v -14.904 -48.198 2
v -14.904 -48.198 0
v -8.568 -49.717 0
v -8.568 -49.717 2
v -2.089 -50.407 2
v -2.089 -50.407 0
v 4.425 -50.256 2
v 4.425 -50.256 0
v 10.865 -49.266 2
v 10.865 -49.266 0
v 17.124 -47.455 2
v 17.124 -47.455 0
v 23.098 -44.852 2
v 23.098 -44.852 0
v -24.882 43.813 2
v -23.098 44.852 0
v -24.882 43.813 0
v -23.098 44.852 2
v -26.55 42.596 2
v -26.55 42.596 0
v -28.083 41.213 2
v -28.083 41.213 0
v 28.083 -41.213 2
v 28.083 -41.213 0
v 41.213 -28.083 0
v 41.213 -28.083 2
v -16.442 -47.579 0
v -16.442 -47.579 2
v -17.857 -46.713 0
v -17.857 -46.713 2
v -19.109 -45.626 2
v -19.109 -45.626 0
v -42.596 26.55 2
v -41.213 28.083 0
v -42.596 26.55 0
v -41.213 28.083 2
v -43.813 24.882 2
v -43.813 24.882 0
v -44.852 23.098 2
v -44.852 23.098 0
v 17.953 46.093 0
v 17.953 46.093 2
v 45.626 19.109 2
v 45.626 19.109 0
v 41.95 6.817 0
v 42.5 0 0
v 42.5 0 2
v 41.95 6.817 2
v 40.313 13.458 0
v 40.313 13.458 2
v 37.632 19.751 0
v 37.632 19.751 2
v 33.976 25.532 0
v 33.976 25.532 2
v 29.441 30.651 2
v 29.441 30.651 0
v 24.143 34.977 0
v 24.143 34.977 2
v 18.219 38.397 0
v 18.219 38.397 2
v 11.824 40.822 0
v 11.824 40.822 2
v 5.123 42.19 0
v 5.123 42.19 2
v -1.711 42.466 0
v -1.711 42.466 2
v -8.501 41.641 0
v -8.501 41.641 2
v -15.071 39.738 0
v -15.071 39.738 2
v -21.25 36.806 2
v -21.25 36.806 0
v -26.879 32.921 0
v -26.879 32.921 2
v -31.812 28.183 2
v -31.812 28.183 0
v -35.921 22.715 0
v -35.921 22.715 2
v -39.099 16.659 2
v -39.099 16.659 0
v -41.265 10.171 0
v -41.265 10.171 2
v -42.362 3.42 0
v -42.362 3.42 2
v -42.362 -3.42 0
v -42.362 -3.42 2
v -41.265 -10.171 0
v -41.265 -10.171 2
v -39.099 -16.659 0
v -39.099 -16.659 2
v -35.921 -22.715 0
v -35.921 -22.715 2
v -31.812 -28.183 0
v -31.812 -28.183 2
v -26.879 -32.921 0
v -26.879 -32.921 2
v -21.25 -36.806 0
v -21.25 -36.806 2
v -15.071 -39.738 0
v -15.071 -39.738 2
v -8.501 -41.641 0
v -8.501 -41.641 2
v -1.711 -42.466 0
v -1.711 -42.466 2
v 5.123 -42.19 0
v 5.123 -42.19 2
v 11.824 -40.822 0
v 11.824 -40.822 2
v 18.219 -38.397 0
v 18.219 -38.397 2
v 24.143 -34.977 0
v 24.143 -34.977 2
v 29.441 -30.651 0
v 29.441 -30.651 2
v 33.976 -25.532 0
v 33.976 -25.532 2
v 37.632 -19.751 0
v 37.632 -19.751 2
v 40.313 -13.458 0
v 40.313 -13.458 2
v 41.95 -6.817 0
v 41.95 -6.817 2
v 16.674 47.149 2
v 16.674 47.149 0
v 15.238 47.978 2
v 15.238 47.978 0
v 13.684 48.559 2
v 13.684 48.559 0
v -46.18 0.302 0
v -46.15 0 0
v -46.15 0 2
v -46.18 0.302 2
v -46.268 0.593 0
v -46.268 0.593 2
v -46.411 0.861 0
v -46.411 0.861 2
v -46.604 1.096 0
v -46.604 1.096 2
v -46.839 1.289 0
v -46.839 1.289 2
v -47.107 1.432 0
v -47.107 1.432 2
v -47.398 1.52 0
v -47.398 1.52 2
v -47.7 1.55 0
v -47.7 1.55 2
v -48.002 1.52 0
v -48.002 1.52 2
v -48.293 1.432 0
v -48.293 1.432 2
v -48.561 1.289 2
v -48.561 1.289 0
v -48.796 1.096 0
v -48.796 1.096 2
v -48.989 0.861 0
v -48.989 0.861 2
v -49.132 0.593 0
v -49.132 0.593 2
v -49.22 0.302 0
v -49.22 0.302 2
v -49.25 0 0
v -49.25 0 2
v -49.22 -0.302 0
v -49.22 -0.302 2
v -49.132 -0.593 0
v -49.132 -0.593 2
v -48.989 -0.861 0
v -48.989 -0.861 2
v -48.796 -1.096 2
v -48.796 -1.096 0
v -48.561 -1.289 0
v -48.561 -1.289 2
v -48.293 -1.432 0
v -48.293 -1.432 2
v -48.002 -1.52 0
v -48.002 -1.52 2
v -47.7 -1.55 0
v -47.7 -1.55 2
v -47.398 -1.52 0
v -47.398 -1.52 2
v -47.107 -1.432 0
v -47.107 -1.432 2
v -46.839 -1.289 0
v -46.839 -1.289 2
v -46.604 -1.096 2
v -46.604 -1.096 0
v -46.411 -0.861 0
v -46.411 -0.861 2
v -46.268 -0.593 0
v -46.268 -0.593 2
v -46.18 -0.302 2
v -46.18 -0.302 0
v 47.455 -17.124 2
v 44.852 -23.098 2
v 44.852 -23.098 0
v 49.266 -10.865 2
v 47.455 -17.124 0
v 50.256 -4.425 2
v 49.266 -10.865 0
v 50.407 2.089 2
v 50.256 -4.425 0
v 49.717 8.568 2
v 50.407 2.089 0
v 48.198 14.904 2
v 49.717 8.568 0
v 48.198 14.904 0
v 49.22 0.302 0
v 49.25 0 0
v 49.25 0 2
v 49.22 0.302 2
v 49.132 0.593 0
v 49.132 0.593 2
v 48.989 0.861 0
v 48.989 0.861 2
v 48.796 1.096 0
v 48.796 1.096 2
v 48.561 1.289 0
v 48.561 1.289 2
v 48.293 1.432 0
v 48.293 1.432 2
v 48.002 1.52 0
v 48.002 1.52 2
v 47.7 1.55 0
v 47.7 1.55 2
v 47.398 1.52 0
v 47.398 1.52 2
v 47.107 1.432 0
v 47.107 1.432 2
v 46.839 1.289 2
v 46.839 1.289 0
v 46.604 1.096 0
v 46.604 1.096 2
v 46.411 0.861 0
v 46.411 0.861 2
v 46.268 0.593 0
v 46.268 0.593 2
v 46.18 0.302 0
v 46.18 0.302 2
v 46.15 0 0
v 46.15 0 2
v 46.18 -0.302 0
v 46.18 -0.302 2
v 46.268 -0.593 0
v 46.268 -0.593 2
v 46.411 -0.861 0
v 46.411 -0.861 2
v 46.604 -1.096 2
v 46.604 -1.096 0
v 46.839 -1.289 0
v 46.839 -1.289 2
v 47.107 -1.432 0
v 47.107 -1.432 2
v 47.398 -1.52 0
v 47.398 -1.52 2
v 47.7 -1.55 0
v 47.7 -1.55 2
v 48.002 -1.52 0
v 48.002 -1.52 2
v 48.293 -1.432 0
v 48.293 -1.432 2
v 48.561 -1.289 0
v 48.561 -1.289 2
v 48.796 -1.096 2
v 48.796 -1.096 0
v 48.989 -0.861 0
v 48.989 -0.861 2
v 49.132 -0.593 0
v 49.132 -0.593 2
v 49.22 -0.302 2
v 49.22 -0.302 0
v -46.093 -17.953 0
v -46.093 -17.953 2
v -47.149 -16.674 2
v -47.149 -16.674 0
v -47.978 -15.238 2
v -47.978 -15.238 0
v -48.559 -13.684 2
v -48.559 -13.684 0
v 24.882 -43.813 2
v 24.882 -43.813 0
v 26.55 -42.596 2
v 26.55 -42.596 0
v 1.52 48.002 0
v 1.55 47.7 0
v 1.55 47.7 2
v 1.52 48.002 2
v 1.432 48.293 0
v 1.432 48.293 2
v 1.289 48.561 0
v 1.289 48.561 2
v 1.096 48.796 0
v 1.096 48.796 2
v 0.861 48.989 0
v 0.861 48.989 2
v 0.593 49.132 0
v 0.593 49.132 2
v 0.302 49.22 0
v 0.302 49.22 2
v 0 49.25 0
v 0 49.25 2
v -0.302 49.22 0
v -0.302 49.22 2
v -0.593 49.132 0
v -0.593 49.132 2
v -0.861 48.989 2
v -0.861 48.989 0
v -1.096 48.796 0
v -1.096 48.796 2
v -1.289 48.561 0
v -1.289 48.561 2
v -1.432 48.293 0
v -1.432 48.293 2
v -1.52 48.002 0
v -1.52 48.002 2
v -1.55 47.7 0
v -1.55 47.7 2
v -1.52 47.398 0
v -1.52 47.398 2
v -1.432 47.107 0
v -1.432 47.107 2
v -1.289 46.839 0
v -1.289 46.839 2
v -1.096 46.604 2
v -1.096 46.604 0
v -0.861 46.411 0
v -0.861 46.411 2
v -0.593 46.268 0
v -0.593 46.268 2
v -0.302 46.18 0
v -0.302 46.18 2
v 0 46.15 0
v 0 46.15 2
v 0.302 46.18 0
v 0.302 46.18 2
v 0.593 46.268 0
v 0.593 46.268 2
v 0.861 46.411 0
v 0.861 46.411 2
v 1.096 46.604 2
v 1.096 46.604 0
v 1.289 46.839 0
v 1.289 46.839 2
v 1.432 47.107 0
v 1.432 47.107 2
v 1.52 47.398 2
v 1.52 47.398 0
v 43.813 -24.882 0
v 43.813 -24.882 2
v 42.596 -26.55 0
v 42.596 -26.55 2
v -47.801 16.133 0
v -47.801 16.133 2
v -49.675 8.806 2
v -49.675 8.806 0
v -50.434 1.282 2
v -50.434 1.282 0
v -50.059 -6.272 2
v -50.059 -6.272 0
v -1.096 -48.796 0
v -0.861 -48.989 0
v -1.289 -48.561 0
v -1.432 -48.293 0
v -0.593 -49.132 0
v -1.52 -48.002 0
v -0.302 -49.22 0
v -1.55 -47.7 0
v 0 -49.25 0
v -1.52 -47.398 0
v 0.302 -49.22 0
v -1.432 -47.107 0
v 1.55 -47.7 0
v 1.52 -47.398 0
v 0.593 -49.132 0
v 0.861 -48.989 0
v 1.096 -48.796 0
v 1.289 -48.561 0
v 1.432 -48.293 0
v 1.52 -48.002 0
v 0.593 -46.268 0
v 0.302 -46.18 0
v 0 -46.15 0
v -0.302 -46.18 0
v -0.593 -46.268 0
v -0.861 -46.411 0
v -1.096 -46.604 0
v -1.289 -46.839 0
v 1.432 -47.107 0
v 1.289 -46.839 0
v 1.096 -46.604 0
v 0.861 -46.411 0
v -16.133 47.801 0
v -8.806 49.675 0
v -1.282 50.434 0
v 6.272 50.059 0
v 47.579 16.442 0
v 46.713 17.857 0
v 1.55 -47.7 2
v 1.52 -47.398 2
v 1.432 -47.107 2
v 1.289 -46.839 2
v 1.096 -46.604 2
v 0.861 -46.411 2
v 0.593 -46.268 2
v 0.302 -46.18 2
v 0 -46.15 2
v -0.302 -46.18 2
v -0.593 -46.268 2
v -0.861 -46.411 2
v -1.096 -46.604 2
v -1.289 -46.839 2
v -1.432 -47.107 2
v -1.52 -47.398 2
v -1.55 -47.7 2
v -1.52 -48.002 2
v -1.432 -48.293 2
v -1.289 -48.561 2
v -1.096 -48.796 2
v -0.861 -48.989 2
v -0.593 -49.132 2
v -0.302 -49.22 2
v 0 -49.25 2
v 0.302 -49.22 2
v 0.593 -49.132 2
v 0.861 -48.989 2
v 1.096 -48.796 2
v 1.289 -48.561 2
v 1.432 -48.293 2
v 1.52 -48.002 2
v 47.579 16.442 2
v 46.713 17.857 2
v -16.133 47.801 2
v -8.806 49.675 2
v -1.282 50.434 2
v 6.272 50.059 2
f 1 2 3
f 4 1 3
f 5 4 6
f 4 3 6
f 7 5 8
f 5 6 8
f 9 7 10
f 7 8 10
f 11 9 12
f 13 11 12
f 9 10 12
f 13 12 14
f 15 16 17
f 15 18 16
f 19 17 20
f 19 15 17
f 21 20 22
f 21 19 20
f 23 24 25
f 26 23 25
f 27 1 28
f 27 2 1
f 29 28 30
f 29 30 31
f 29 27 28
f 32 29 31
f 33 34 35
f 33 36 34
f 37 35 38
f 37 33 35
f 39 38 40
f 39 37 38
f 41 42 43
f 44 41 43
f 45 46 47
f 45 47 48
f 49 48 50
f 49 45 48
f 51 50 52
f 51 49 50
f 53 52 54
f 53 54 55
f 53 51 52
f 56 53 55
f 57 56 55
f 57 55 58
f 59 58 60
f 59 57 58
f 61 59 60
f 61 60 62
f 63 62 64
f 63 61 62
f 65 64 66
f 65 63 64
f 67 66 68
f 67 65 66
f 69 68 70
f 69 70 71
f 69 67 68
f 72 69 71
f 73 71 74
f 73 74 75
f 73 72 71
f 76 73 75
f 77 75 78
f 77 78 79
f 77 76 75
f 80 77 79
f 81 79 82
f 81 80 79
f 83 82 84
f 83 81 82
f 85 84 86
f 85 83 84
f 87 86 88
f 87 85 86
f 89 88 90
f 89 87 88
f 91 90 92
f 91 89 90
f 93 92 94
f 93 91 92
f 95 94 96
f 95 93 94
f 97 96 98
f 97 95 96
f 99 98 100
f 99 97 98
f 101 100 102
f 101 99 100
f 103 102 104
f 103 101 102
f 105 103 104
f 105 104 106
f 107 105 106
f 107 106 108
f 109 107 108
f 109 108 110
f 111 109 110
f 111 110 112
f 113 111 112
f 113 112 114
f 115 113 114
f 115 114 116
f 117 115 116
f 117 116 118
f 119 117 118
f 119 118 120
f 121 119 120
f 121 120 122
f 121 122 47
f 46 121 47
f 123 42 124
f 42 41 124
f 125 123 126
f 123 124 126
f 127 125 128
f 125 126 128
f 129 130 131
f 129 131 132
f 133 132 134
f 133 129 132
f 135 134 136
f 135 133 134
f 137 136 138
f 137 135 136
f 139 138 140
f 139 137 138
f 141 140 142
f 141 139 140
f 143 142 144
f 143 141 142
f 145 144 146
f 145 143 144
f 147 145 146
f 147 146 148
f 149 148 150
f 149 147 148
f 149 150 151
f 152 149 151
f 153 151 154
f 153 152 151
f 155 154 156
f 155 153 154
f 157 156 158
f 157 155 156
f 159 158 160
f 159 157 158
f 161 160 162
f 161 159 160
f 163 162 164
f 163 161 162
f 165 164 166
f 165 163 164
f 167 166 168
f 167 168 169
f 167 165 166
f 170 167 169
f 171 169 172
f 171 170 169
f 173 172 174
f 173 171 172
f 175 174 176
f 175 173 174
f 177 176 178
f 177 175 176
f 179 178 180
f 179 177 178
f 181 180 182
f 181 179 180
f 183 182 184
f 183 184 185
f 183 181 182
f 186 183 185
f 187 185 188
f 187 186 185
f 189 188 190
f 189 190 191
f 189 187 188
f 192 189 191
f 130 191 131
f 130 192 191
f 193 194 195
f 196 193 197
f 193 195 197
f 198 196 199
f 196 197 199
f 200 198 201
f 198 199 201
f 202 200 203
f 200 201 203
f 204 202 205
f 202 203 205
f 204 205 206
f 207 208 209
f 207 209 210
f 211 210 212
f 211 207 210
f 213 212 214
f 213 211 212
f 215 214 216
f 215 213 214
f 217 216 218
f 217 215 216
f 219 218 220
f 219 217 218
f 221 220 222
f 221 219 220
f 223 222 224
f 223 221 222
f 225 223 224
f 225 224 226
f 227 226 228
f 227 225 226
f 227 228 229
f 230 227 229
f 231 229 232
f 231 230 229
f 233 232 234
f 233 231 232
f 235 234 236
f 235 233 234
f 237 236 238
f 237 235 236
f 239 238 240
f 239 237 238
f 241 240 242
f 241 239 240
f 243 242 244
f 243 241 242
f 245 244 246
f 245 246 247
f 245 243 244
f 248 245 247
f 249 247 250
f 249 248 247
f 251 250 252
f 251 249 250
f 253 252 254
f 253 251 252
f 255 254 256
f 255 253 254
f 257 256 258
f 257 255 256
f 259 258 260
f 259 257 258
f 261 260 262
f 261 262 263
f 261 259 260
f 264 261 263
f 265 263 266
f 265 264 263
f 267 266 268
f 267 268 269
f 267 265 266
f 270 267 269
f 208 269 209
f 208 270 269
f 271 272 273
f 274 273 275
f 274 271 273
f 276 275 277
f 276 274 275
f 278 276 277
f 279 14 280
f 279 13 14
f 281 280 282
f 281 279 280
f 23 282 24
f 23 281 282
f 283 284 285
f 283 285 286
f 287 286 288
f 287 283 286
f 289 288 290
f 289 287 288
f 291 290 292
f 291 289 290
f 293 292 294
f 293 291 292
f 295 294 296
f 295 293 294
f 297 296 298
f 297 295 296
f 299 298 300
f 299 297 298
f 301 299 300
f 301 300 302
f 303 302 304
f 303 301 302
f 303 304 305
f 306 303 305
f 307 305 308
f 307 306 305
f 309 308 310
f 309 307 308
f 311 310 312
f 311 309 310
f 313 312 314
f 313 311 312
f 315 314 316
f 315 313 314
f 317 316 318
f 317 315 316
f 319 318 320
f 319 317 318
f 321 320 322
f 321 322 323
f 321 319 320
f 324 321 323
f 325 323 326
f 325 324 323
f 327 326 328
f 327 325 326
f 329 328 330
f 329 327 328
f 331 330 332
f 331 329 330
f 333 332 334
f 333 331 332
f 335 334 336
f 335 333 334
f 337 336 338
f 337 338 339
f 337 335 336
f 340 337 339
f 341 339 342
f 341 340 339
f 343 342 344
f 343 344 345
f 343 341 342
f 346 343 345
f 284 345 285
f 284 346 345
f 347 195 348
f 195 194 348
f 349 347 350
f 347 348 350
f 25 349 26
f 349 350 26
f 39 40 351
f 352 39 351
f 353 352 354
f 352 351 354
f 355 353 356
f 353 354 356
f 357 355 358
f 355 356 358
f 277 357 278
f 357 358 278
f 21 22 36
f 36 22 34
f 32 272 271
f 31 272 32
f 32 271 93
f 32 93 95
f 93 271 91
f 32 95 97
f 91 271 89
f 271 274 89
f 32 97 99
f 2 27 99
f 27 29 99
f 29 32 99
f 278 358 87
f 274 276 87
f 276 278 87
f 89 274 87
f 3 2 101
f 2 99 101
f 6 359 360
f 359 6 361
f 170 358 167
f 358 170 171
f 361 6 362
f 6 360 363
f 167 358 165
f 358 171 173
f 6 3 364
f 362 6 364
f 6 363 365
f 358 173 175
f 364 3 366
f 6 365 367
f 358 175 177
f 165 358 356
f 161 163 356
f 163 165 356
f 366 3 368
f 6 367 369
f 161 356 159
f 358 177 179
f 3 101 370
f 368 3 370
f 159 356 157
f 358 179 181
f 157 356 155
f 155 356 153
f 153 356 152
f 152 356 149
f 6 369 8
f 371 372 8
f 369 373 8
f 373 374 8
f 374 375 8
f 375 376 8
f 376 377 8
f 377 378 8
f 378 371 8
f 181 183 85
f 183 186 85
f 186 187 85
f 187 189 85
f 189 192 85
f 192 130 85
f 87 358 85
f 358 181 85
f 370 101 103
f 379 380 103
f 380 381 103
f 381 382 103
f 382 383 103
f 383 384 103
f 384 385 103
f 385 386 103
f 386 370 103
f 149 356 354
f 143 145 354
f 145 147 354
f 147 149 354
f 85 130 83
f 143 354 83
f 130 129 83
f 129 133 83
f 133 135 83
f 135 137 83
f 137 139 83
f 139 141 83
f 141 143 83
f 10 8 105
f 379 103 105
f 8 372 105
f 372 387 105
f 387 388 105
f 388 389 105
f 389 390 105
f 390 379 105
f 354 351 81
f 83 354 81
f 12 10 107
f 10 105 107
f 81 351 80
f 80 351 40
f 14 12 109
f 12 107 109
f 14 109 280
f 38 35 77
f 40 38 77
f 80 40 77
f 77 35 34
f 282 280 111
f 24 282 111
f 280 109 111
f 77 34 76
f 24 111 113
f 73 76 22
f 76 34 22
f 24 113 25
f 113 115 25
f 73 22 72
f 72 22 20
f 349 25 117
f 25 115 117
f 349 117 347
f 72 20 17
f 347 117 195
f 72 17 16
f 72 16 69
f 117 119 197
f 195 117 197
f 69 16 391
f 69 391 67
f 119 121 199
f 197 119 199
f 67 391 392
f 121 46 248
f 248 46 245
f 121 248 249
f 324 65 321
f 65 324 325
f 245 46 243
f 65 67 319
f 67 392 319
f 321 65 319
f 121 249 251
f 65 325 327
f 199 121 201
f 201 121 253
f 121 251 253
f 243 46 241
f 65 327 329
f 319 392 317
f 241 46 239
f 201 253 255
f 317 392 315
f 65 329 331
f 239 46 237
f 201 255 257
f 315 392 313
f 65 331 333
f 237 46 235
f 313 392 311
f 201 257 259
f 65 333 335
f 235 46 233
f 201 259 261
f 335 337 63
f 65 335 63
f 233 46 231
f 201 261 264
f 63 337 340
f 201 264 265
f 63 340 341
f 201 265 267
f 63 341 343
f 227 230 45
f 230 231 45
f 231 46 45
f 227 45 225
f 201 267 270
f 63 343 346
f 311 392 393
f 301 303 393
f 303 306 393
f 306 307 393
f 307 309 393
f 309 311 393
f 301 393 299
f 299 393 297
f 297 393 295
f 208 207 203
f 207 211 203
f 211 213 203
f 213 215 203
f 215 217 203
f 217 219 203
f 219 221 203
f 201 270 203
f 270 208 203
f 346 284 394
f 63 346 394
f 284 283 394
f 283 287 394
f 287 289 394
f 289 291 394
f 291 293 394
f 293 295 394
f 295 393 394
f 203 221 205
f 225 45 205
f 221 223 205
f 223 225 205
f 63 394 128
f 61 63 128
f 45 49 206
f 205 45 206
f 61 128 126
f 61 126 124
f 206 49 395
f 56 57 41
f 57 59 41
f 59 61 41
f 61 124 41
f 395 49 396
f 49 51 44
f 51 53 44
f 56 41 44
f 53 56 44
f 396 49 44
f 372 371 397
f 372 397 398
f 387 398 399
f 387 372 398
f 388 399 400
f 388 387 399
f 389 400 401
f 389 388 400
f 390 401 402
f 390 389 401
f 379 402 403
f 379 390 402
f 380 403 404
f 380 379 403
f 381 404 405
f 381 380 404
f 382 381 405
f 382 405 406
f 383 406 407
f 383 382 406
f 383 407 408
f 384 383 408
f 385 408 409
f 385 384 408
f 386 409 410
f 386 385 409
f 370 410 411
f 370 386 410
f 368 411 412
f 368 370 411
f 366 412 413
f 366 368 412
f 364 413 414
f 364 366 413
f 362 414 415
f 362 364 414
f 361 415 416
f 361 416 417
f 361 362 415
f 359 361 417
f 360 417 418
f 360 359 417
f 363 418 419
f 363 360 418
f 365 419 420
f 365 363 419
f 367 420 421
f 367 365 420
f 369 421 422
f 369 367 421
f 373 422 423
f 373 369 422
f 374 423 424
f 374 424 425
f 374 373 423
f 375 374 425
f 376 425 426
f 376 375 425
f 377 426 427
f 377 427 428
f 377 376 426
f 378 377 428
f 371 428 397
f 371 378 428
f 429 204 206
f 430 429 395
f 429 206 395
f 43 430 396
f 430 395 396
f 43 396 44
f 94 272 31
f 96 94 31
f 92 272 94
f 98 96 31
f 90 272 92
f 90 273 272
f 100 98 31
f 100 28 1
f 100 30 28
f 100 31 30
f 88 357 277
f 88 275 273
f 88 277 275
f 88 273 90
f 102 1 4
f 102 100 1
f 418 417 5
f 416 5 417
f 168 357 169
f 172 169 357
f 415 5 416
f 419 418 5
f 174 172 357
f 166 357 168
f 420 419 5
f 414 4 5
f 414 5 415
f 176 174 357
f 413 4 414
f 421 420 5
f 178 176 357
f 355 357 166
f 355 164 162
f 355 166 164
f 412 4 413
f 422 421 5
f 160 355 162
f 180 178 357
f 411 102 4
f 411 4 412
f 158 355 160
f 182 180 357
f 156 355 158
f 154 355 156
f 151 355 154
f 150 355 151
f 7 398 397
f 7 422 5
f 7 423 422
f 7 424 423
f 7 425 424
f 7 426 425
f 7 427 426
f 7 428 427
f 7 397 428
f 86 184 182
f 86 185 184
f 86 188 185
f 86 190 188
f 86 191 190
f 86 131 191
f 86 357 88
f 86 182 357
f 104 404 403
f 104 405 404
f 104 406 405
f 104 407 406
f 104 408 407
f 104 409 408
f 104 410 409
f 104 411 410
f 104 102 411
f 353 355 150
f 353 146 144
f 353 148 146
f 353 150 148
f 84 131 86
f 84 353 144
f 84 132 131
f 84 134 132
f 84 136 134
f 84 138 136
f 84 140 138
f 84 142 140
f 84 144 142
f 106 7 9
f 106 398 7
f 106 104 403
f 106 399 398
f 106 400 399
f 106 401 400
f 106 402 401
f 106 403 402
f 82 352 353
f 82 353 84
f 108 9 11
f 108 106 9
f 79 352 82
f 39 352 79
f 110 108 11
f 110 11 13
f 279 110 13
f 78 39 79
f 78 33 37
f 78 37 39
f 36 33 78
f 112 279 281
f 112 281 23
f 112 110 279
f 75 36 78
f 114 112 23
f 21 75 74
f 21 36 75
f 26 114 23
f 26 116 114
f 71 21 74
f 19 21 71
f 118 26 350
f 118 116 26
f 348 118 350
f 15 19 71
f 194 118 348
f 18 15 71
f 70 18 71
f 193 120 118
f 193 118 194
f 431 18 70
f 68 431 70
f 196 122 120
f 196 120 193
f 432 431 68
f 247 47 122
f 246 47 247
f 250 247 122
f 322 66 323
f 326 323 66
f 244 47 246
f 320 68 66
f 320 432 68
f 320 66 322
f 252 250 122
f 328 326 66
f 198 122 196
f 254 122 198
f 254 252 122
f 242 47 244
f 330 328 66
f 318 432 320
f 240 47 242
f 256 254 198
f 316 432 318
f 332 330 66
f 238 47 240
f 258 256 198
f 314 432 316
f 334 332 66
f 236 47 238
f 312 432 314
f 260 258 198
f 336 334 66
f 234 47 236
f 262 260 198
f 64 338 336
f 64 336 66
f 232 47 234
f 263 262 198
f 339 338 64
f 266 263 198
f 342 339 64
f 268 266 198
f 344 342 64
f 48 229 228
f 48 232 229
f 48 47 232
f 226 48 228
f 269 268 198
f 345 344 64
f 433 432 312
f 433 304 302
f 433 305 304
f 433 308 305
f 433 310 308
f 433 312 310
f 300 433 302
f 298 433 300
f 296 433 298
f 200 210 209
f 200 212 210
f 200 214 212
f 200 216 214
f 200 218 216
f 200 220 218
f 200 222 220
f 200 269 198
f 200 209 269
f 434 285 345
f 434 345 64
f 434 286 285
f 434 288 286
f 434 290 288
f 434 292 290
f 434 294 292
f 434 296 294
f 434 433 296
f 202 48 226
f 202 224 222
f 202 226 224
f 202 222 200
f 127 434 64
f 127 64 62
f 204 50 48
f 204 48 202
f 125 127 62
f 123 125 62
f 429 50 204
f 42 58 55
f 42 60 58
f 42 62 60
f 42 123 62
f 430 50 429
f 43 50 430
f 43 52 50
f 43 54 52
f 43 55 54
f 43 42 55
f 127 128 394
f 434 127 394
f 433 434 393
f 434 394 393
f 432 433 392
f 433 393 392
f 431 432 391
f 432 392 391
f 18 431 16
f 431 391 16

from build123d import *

# Parameters (mm, degrees)
SKETCH_1_R          = 50.45
SKETCH_1_R_2        = 1.55
SKETCH_1_R_3        = 42.5
EXTRUDE_1_DEPTH     = 2
CUT_EXTRUDE_START   = -8
CUT_EXTRUDE_1_DEPTH = 8
FILLET_1_R          = 20
CUT_EXTRUDE_2_DEPTH = 10
CUT_EXTRUDE_3_DEPTH = 10
FILLET_2_R          = 10


with BuildPart() as part:
    # 草图1 → 凸台-拉伸1 (new body)
    with BuildSketch(Plane.XY):
        Circle(SKETCH_1_R)
        with Locations((0, 47.7)):
            Circle(SKETCH_1_R_2, mode=Mode.SUBTRACT)
        with Locations((47.7, 0)):
            Circle(SKETCH_1_R_2, mode=Mode.SUBTRACT)
        with Locations((0, -47.7)):
            Circle(SKETCH_1_R_2, mode=Mode.SUBTRACT)
        with Locations((-47.7, 0)):
            Circle(SKETCH_1_R_2, mode=Mode.SUBTRACT)
        Circle(SKETCH_1_R_3, mode=Mode.SUBTRACT)
    extrude(amount=EXTRUDE_1_DEPTH)

    # 草图2 → 切除-拉伸1 (cut)
    with BuildSketch(Plane.XY.offset(2).offset(CUT_EXTRUDE_START)):
        with BuildLine():
            Line((-26.156986786, 43.13947777), (-43.13947777, 26.156986786))
            ThreePointArc((-43.13947777, 26.156986786), (-35.673537111, 35.673537111), (-26.156986786, 43.13947777))
        make_face()
        with BuildLine():
            Line((43.13947777, 26.156986786), (26.156986786, 43.13947777))
            ThreePointArc((26.156986786, 43.13947777), (35.673537111, 35.673537111), (43.13947777, 26.156986786))
        make_face()
        with BuildLine():
            Line((26.156986786, -43.13947777), (43.13947777, -26.156986786))
            ThreePointArc((43.13947777, -26.156986786), (35.673537111, -35.673537111), (26.156986786, -43.13947777))
        make_face()
        with BuildLine():
            Line((-43.13947777, -26.156986786), (-26.156986786, -43.13947777))
            ThreePointArc((-26.156986786, -43.13947777), (-35.673537111, -35.673537111), (-43.13947777, -26.156986786))
        make_face()
    extrude(amount=CUT_EXTRUDE_1_DEPTH, mode=Mode.SUBTRACT)

    # 圆角1
    fillet_1_edges = [part.edges().sort_by_distance(p)[0] for p in [
        (-26.156986786, 43.13947777, 1),
        (-43.13947777, 26.156986786, 1),
        (43.13947777, 26.156986786, 1),
        (26.156986786, 43.13947777, 1),
        (26.156986786, -43.13947777, 1),
        (43.13947777, -26.156986786, 1),
        (-43.13947777, -26.156986786, 1),
        (-26.156986786, -43.13947777, 1),
    ]]
    fillet(fillet_1_edges, radius=FILLET_1_R)

    # 草图4 → 切除-拉伸2 (cut)
    with BuildSketch(Plane.XY.offset(2)):
        Polygon((-18.704164587, -51.054840678), (-51.986667617, -16.922686111), (-49.480801159, -14.479198174), (-16.19829813, -48.611352741), align=None)
        Polygon((48.611352741, 16.19829813), (51.054840678, 18.704164587), (16.922686111, 51.986667617), (14.479198174, 49.480801159), align=None)
    extrude(amount=-CUT_EXTRUDE_2_DEPTH, mode=Mode.SUBTRACT)


with BuildPart() as cut_extrude_2_piece_1:
    # of the separate pieces the step leaves, piece 1, a body of its own (cut_extrude_2_pieces)
    add(part.part.solids().sort_by_distance((44.852039635, -23.097554862, 0))[0])

    # 圆角2
    fillet_2_edges = [cut_extrude_2_piece_1.edges().sort_by_distance(p)[0] for p in [
        (-17.437312859, -47.340707855, 1),
        (47.340707855, 17.437312859, 1),
        (16.238659163, 47.765138423, 1),
        (-47.765138423, -16.238659163, 1),
    ]]
    fillet(fillet_2_edges, radius=FILLET_2_R)


with BuildPart() as cut_extrude_2_piece_2:
    # of the separate pieces the step leaves, piece 2, a body of its own (cut_extrude_2_pieces)
    add(part.part.solids().sort_by_distance((-36.822783654, -32.473680902, 0))[0])


with BuildPart() as cut_extrude_2_piece_3:
    # of the separate pieces the step leaves, piece 3, a body of its own (cut_extrude_2_pieces)
    add(part.part.solids().sort_by_distance((32.473680902, 36.822783654, 0))[0])


with BuildPart() as cut_extrude_3_tool:
    # 草图5 → 切除-拉伸3 (new body)
    with BuildSketch(Plane.XY.offset(2)):
        with BuildLine():
            Line((-36.822783654, -32.473680902), (-42.579696276, -26.569803082))
            ThreePointArc((-42.579696276, -26.569803082), (-41.915837064, -27.343862298), (-41.213386503, -28.083078053))
            Line((-41.213386503, -28.083078053), (-36.822783654, -32.473680902))
        make_face()
        with BuildLine():
            Line((26.569803082, 42.579696276), (32.473680902, 36.822783654))
            Line((32.473680902, 36.822783654), (28.083078053, 41.213386503))
            ThreePointArc((28.083078053, 41.213386503), (27.343862298, 41.915837064), (26.569803082, 42.579696276))
        make_face()
    extrude(amount=-CUT_EXTRUDE_3_DEPTH)


with BuildPart() as cut_extrude_2_piece_2_1:
    add(cut_extrude_2_piece_2.part)

    # 切除-拉伸3: cut by cut_extrude_3_tool
    add(cut_extrude_3_tool.part, mode=Mode.SUBTRACT)


with BuildPart() as cut_extrude_2_piece_3_1:
    add(cut_extrude_2_piece_3.part)

    # 切除-拉伸3: cut by cut_extrude_3_tool
    add(cut_extrude_3_tool.part, mode=Mode.SUBTRACT)


solid = cut_extrude_2_piece_1.part
